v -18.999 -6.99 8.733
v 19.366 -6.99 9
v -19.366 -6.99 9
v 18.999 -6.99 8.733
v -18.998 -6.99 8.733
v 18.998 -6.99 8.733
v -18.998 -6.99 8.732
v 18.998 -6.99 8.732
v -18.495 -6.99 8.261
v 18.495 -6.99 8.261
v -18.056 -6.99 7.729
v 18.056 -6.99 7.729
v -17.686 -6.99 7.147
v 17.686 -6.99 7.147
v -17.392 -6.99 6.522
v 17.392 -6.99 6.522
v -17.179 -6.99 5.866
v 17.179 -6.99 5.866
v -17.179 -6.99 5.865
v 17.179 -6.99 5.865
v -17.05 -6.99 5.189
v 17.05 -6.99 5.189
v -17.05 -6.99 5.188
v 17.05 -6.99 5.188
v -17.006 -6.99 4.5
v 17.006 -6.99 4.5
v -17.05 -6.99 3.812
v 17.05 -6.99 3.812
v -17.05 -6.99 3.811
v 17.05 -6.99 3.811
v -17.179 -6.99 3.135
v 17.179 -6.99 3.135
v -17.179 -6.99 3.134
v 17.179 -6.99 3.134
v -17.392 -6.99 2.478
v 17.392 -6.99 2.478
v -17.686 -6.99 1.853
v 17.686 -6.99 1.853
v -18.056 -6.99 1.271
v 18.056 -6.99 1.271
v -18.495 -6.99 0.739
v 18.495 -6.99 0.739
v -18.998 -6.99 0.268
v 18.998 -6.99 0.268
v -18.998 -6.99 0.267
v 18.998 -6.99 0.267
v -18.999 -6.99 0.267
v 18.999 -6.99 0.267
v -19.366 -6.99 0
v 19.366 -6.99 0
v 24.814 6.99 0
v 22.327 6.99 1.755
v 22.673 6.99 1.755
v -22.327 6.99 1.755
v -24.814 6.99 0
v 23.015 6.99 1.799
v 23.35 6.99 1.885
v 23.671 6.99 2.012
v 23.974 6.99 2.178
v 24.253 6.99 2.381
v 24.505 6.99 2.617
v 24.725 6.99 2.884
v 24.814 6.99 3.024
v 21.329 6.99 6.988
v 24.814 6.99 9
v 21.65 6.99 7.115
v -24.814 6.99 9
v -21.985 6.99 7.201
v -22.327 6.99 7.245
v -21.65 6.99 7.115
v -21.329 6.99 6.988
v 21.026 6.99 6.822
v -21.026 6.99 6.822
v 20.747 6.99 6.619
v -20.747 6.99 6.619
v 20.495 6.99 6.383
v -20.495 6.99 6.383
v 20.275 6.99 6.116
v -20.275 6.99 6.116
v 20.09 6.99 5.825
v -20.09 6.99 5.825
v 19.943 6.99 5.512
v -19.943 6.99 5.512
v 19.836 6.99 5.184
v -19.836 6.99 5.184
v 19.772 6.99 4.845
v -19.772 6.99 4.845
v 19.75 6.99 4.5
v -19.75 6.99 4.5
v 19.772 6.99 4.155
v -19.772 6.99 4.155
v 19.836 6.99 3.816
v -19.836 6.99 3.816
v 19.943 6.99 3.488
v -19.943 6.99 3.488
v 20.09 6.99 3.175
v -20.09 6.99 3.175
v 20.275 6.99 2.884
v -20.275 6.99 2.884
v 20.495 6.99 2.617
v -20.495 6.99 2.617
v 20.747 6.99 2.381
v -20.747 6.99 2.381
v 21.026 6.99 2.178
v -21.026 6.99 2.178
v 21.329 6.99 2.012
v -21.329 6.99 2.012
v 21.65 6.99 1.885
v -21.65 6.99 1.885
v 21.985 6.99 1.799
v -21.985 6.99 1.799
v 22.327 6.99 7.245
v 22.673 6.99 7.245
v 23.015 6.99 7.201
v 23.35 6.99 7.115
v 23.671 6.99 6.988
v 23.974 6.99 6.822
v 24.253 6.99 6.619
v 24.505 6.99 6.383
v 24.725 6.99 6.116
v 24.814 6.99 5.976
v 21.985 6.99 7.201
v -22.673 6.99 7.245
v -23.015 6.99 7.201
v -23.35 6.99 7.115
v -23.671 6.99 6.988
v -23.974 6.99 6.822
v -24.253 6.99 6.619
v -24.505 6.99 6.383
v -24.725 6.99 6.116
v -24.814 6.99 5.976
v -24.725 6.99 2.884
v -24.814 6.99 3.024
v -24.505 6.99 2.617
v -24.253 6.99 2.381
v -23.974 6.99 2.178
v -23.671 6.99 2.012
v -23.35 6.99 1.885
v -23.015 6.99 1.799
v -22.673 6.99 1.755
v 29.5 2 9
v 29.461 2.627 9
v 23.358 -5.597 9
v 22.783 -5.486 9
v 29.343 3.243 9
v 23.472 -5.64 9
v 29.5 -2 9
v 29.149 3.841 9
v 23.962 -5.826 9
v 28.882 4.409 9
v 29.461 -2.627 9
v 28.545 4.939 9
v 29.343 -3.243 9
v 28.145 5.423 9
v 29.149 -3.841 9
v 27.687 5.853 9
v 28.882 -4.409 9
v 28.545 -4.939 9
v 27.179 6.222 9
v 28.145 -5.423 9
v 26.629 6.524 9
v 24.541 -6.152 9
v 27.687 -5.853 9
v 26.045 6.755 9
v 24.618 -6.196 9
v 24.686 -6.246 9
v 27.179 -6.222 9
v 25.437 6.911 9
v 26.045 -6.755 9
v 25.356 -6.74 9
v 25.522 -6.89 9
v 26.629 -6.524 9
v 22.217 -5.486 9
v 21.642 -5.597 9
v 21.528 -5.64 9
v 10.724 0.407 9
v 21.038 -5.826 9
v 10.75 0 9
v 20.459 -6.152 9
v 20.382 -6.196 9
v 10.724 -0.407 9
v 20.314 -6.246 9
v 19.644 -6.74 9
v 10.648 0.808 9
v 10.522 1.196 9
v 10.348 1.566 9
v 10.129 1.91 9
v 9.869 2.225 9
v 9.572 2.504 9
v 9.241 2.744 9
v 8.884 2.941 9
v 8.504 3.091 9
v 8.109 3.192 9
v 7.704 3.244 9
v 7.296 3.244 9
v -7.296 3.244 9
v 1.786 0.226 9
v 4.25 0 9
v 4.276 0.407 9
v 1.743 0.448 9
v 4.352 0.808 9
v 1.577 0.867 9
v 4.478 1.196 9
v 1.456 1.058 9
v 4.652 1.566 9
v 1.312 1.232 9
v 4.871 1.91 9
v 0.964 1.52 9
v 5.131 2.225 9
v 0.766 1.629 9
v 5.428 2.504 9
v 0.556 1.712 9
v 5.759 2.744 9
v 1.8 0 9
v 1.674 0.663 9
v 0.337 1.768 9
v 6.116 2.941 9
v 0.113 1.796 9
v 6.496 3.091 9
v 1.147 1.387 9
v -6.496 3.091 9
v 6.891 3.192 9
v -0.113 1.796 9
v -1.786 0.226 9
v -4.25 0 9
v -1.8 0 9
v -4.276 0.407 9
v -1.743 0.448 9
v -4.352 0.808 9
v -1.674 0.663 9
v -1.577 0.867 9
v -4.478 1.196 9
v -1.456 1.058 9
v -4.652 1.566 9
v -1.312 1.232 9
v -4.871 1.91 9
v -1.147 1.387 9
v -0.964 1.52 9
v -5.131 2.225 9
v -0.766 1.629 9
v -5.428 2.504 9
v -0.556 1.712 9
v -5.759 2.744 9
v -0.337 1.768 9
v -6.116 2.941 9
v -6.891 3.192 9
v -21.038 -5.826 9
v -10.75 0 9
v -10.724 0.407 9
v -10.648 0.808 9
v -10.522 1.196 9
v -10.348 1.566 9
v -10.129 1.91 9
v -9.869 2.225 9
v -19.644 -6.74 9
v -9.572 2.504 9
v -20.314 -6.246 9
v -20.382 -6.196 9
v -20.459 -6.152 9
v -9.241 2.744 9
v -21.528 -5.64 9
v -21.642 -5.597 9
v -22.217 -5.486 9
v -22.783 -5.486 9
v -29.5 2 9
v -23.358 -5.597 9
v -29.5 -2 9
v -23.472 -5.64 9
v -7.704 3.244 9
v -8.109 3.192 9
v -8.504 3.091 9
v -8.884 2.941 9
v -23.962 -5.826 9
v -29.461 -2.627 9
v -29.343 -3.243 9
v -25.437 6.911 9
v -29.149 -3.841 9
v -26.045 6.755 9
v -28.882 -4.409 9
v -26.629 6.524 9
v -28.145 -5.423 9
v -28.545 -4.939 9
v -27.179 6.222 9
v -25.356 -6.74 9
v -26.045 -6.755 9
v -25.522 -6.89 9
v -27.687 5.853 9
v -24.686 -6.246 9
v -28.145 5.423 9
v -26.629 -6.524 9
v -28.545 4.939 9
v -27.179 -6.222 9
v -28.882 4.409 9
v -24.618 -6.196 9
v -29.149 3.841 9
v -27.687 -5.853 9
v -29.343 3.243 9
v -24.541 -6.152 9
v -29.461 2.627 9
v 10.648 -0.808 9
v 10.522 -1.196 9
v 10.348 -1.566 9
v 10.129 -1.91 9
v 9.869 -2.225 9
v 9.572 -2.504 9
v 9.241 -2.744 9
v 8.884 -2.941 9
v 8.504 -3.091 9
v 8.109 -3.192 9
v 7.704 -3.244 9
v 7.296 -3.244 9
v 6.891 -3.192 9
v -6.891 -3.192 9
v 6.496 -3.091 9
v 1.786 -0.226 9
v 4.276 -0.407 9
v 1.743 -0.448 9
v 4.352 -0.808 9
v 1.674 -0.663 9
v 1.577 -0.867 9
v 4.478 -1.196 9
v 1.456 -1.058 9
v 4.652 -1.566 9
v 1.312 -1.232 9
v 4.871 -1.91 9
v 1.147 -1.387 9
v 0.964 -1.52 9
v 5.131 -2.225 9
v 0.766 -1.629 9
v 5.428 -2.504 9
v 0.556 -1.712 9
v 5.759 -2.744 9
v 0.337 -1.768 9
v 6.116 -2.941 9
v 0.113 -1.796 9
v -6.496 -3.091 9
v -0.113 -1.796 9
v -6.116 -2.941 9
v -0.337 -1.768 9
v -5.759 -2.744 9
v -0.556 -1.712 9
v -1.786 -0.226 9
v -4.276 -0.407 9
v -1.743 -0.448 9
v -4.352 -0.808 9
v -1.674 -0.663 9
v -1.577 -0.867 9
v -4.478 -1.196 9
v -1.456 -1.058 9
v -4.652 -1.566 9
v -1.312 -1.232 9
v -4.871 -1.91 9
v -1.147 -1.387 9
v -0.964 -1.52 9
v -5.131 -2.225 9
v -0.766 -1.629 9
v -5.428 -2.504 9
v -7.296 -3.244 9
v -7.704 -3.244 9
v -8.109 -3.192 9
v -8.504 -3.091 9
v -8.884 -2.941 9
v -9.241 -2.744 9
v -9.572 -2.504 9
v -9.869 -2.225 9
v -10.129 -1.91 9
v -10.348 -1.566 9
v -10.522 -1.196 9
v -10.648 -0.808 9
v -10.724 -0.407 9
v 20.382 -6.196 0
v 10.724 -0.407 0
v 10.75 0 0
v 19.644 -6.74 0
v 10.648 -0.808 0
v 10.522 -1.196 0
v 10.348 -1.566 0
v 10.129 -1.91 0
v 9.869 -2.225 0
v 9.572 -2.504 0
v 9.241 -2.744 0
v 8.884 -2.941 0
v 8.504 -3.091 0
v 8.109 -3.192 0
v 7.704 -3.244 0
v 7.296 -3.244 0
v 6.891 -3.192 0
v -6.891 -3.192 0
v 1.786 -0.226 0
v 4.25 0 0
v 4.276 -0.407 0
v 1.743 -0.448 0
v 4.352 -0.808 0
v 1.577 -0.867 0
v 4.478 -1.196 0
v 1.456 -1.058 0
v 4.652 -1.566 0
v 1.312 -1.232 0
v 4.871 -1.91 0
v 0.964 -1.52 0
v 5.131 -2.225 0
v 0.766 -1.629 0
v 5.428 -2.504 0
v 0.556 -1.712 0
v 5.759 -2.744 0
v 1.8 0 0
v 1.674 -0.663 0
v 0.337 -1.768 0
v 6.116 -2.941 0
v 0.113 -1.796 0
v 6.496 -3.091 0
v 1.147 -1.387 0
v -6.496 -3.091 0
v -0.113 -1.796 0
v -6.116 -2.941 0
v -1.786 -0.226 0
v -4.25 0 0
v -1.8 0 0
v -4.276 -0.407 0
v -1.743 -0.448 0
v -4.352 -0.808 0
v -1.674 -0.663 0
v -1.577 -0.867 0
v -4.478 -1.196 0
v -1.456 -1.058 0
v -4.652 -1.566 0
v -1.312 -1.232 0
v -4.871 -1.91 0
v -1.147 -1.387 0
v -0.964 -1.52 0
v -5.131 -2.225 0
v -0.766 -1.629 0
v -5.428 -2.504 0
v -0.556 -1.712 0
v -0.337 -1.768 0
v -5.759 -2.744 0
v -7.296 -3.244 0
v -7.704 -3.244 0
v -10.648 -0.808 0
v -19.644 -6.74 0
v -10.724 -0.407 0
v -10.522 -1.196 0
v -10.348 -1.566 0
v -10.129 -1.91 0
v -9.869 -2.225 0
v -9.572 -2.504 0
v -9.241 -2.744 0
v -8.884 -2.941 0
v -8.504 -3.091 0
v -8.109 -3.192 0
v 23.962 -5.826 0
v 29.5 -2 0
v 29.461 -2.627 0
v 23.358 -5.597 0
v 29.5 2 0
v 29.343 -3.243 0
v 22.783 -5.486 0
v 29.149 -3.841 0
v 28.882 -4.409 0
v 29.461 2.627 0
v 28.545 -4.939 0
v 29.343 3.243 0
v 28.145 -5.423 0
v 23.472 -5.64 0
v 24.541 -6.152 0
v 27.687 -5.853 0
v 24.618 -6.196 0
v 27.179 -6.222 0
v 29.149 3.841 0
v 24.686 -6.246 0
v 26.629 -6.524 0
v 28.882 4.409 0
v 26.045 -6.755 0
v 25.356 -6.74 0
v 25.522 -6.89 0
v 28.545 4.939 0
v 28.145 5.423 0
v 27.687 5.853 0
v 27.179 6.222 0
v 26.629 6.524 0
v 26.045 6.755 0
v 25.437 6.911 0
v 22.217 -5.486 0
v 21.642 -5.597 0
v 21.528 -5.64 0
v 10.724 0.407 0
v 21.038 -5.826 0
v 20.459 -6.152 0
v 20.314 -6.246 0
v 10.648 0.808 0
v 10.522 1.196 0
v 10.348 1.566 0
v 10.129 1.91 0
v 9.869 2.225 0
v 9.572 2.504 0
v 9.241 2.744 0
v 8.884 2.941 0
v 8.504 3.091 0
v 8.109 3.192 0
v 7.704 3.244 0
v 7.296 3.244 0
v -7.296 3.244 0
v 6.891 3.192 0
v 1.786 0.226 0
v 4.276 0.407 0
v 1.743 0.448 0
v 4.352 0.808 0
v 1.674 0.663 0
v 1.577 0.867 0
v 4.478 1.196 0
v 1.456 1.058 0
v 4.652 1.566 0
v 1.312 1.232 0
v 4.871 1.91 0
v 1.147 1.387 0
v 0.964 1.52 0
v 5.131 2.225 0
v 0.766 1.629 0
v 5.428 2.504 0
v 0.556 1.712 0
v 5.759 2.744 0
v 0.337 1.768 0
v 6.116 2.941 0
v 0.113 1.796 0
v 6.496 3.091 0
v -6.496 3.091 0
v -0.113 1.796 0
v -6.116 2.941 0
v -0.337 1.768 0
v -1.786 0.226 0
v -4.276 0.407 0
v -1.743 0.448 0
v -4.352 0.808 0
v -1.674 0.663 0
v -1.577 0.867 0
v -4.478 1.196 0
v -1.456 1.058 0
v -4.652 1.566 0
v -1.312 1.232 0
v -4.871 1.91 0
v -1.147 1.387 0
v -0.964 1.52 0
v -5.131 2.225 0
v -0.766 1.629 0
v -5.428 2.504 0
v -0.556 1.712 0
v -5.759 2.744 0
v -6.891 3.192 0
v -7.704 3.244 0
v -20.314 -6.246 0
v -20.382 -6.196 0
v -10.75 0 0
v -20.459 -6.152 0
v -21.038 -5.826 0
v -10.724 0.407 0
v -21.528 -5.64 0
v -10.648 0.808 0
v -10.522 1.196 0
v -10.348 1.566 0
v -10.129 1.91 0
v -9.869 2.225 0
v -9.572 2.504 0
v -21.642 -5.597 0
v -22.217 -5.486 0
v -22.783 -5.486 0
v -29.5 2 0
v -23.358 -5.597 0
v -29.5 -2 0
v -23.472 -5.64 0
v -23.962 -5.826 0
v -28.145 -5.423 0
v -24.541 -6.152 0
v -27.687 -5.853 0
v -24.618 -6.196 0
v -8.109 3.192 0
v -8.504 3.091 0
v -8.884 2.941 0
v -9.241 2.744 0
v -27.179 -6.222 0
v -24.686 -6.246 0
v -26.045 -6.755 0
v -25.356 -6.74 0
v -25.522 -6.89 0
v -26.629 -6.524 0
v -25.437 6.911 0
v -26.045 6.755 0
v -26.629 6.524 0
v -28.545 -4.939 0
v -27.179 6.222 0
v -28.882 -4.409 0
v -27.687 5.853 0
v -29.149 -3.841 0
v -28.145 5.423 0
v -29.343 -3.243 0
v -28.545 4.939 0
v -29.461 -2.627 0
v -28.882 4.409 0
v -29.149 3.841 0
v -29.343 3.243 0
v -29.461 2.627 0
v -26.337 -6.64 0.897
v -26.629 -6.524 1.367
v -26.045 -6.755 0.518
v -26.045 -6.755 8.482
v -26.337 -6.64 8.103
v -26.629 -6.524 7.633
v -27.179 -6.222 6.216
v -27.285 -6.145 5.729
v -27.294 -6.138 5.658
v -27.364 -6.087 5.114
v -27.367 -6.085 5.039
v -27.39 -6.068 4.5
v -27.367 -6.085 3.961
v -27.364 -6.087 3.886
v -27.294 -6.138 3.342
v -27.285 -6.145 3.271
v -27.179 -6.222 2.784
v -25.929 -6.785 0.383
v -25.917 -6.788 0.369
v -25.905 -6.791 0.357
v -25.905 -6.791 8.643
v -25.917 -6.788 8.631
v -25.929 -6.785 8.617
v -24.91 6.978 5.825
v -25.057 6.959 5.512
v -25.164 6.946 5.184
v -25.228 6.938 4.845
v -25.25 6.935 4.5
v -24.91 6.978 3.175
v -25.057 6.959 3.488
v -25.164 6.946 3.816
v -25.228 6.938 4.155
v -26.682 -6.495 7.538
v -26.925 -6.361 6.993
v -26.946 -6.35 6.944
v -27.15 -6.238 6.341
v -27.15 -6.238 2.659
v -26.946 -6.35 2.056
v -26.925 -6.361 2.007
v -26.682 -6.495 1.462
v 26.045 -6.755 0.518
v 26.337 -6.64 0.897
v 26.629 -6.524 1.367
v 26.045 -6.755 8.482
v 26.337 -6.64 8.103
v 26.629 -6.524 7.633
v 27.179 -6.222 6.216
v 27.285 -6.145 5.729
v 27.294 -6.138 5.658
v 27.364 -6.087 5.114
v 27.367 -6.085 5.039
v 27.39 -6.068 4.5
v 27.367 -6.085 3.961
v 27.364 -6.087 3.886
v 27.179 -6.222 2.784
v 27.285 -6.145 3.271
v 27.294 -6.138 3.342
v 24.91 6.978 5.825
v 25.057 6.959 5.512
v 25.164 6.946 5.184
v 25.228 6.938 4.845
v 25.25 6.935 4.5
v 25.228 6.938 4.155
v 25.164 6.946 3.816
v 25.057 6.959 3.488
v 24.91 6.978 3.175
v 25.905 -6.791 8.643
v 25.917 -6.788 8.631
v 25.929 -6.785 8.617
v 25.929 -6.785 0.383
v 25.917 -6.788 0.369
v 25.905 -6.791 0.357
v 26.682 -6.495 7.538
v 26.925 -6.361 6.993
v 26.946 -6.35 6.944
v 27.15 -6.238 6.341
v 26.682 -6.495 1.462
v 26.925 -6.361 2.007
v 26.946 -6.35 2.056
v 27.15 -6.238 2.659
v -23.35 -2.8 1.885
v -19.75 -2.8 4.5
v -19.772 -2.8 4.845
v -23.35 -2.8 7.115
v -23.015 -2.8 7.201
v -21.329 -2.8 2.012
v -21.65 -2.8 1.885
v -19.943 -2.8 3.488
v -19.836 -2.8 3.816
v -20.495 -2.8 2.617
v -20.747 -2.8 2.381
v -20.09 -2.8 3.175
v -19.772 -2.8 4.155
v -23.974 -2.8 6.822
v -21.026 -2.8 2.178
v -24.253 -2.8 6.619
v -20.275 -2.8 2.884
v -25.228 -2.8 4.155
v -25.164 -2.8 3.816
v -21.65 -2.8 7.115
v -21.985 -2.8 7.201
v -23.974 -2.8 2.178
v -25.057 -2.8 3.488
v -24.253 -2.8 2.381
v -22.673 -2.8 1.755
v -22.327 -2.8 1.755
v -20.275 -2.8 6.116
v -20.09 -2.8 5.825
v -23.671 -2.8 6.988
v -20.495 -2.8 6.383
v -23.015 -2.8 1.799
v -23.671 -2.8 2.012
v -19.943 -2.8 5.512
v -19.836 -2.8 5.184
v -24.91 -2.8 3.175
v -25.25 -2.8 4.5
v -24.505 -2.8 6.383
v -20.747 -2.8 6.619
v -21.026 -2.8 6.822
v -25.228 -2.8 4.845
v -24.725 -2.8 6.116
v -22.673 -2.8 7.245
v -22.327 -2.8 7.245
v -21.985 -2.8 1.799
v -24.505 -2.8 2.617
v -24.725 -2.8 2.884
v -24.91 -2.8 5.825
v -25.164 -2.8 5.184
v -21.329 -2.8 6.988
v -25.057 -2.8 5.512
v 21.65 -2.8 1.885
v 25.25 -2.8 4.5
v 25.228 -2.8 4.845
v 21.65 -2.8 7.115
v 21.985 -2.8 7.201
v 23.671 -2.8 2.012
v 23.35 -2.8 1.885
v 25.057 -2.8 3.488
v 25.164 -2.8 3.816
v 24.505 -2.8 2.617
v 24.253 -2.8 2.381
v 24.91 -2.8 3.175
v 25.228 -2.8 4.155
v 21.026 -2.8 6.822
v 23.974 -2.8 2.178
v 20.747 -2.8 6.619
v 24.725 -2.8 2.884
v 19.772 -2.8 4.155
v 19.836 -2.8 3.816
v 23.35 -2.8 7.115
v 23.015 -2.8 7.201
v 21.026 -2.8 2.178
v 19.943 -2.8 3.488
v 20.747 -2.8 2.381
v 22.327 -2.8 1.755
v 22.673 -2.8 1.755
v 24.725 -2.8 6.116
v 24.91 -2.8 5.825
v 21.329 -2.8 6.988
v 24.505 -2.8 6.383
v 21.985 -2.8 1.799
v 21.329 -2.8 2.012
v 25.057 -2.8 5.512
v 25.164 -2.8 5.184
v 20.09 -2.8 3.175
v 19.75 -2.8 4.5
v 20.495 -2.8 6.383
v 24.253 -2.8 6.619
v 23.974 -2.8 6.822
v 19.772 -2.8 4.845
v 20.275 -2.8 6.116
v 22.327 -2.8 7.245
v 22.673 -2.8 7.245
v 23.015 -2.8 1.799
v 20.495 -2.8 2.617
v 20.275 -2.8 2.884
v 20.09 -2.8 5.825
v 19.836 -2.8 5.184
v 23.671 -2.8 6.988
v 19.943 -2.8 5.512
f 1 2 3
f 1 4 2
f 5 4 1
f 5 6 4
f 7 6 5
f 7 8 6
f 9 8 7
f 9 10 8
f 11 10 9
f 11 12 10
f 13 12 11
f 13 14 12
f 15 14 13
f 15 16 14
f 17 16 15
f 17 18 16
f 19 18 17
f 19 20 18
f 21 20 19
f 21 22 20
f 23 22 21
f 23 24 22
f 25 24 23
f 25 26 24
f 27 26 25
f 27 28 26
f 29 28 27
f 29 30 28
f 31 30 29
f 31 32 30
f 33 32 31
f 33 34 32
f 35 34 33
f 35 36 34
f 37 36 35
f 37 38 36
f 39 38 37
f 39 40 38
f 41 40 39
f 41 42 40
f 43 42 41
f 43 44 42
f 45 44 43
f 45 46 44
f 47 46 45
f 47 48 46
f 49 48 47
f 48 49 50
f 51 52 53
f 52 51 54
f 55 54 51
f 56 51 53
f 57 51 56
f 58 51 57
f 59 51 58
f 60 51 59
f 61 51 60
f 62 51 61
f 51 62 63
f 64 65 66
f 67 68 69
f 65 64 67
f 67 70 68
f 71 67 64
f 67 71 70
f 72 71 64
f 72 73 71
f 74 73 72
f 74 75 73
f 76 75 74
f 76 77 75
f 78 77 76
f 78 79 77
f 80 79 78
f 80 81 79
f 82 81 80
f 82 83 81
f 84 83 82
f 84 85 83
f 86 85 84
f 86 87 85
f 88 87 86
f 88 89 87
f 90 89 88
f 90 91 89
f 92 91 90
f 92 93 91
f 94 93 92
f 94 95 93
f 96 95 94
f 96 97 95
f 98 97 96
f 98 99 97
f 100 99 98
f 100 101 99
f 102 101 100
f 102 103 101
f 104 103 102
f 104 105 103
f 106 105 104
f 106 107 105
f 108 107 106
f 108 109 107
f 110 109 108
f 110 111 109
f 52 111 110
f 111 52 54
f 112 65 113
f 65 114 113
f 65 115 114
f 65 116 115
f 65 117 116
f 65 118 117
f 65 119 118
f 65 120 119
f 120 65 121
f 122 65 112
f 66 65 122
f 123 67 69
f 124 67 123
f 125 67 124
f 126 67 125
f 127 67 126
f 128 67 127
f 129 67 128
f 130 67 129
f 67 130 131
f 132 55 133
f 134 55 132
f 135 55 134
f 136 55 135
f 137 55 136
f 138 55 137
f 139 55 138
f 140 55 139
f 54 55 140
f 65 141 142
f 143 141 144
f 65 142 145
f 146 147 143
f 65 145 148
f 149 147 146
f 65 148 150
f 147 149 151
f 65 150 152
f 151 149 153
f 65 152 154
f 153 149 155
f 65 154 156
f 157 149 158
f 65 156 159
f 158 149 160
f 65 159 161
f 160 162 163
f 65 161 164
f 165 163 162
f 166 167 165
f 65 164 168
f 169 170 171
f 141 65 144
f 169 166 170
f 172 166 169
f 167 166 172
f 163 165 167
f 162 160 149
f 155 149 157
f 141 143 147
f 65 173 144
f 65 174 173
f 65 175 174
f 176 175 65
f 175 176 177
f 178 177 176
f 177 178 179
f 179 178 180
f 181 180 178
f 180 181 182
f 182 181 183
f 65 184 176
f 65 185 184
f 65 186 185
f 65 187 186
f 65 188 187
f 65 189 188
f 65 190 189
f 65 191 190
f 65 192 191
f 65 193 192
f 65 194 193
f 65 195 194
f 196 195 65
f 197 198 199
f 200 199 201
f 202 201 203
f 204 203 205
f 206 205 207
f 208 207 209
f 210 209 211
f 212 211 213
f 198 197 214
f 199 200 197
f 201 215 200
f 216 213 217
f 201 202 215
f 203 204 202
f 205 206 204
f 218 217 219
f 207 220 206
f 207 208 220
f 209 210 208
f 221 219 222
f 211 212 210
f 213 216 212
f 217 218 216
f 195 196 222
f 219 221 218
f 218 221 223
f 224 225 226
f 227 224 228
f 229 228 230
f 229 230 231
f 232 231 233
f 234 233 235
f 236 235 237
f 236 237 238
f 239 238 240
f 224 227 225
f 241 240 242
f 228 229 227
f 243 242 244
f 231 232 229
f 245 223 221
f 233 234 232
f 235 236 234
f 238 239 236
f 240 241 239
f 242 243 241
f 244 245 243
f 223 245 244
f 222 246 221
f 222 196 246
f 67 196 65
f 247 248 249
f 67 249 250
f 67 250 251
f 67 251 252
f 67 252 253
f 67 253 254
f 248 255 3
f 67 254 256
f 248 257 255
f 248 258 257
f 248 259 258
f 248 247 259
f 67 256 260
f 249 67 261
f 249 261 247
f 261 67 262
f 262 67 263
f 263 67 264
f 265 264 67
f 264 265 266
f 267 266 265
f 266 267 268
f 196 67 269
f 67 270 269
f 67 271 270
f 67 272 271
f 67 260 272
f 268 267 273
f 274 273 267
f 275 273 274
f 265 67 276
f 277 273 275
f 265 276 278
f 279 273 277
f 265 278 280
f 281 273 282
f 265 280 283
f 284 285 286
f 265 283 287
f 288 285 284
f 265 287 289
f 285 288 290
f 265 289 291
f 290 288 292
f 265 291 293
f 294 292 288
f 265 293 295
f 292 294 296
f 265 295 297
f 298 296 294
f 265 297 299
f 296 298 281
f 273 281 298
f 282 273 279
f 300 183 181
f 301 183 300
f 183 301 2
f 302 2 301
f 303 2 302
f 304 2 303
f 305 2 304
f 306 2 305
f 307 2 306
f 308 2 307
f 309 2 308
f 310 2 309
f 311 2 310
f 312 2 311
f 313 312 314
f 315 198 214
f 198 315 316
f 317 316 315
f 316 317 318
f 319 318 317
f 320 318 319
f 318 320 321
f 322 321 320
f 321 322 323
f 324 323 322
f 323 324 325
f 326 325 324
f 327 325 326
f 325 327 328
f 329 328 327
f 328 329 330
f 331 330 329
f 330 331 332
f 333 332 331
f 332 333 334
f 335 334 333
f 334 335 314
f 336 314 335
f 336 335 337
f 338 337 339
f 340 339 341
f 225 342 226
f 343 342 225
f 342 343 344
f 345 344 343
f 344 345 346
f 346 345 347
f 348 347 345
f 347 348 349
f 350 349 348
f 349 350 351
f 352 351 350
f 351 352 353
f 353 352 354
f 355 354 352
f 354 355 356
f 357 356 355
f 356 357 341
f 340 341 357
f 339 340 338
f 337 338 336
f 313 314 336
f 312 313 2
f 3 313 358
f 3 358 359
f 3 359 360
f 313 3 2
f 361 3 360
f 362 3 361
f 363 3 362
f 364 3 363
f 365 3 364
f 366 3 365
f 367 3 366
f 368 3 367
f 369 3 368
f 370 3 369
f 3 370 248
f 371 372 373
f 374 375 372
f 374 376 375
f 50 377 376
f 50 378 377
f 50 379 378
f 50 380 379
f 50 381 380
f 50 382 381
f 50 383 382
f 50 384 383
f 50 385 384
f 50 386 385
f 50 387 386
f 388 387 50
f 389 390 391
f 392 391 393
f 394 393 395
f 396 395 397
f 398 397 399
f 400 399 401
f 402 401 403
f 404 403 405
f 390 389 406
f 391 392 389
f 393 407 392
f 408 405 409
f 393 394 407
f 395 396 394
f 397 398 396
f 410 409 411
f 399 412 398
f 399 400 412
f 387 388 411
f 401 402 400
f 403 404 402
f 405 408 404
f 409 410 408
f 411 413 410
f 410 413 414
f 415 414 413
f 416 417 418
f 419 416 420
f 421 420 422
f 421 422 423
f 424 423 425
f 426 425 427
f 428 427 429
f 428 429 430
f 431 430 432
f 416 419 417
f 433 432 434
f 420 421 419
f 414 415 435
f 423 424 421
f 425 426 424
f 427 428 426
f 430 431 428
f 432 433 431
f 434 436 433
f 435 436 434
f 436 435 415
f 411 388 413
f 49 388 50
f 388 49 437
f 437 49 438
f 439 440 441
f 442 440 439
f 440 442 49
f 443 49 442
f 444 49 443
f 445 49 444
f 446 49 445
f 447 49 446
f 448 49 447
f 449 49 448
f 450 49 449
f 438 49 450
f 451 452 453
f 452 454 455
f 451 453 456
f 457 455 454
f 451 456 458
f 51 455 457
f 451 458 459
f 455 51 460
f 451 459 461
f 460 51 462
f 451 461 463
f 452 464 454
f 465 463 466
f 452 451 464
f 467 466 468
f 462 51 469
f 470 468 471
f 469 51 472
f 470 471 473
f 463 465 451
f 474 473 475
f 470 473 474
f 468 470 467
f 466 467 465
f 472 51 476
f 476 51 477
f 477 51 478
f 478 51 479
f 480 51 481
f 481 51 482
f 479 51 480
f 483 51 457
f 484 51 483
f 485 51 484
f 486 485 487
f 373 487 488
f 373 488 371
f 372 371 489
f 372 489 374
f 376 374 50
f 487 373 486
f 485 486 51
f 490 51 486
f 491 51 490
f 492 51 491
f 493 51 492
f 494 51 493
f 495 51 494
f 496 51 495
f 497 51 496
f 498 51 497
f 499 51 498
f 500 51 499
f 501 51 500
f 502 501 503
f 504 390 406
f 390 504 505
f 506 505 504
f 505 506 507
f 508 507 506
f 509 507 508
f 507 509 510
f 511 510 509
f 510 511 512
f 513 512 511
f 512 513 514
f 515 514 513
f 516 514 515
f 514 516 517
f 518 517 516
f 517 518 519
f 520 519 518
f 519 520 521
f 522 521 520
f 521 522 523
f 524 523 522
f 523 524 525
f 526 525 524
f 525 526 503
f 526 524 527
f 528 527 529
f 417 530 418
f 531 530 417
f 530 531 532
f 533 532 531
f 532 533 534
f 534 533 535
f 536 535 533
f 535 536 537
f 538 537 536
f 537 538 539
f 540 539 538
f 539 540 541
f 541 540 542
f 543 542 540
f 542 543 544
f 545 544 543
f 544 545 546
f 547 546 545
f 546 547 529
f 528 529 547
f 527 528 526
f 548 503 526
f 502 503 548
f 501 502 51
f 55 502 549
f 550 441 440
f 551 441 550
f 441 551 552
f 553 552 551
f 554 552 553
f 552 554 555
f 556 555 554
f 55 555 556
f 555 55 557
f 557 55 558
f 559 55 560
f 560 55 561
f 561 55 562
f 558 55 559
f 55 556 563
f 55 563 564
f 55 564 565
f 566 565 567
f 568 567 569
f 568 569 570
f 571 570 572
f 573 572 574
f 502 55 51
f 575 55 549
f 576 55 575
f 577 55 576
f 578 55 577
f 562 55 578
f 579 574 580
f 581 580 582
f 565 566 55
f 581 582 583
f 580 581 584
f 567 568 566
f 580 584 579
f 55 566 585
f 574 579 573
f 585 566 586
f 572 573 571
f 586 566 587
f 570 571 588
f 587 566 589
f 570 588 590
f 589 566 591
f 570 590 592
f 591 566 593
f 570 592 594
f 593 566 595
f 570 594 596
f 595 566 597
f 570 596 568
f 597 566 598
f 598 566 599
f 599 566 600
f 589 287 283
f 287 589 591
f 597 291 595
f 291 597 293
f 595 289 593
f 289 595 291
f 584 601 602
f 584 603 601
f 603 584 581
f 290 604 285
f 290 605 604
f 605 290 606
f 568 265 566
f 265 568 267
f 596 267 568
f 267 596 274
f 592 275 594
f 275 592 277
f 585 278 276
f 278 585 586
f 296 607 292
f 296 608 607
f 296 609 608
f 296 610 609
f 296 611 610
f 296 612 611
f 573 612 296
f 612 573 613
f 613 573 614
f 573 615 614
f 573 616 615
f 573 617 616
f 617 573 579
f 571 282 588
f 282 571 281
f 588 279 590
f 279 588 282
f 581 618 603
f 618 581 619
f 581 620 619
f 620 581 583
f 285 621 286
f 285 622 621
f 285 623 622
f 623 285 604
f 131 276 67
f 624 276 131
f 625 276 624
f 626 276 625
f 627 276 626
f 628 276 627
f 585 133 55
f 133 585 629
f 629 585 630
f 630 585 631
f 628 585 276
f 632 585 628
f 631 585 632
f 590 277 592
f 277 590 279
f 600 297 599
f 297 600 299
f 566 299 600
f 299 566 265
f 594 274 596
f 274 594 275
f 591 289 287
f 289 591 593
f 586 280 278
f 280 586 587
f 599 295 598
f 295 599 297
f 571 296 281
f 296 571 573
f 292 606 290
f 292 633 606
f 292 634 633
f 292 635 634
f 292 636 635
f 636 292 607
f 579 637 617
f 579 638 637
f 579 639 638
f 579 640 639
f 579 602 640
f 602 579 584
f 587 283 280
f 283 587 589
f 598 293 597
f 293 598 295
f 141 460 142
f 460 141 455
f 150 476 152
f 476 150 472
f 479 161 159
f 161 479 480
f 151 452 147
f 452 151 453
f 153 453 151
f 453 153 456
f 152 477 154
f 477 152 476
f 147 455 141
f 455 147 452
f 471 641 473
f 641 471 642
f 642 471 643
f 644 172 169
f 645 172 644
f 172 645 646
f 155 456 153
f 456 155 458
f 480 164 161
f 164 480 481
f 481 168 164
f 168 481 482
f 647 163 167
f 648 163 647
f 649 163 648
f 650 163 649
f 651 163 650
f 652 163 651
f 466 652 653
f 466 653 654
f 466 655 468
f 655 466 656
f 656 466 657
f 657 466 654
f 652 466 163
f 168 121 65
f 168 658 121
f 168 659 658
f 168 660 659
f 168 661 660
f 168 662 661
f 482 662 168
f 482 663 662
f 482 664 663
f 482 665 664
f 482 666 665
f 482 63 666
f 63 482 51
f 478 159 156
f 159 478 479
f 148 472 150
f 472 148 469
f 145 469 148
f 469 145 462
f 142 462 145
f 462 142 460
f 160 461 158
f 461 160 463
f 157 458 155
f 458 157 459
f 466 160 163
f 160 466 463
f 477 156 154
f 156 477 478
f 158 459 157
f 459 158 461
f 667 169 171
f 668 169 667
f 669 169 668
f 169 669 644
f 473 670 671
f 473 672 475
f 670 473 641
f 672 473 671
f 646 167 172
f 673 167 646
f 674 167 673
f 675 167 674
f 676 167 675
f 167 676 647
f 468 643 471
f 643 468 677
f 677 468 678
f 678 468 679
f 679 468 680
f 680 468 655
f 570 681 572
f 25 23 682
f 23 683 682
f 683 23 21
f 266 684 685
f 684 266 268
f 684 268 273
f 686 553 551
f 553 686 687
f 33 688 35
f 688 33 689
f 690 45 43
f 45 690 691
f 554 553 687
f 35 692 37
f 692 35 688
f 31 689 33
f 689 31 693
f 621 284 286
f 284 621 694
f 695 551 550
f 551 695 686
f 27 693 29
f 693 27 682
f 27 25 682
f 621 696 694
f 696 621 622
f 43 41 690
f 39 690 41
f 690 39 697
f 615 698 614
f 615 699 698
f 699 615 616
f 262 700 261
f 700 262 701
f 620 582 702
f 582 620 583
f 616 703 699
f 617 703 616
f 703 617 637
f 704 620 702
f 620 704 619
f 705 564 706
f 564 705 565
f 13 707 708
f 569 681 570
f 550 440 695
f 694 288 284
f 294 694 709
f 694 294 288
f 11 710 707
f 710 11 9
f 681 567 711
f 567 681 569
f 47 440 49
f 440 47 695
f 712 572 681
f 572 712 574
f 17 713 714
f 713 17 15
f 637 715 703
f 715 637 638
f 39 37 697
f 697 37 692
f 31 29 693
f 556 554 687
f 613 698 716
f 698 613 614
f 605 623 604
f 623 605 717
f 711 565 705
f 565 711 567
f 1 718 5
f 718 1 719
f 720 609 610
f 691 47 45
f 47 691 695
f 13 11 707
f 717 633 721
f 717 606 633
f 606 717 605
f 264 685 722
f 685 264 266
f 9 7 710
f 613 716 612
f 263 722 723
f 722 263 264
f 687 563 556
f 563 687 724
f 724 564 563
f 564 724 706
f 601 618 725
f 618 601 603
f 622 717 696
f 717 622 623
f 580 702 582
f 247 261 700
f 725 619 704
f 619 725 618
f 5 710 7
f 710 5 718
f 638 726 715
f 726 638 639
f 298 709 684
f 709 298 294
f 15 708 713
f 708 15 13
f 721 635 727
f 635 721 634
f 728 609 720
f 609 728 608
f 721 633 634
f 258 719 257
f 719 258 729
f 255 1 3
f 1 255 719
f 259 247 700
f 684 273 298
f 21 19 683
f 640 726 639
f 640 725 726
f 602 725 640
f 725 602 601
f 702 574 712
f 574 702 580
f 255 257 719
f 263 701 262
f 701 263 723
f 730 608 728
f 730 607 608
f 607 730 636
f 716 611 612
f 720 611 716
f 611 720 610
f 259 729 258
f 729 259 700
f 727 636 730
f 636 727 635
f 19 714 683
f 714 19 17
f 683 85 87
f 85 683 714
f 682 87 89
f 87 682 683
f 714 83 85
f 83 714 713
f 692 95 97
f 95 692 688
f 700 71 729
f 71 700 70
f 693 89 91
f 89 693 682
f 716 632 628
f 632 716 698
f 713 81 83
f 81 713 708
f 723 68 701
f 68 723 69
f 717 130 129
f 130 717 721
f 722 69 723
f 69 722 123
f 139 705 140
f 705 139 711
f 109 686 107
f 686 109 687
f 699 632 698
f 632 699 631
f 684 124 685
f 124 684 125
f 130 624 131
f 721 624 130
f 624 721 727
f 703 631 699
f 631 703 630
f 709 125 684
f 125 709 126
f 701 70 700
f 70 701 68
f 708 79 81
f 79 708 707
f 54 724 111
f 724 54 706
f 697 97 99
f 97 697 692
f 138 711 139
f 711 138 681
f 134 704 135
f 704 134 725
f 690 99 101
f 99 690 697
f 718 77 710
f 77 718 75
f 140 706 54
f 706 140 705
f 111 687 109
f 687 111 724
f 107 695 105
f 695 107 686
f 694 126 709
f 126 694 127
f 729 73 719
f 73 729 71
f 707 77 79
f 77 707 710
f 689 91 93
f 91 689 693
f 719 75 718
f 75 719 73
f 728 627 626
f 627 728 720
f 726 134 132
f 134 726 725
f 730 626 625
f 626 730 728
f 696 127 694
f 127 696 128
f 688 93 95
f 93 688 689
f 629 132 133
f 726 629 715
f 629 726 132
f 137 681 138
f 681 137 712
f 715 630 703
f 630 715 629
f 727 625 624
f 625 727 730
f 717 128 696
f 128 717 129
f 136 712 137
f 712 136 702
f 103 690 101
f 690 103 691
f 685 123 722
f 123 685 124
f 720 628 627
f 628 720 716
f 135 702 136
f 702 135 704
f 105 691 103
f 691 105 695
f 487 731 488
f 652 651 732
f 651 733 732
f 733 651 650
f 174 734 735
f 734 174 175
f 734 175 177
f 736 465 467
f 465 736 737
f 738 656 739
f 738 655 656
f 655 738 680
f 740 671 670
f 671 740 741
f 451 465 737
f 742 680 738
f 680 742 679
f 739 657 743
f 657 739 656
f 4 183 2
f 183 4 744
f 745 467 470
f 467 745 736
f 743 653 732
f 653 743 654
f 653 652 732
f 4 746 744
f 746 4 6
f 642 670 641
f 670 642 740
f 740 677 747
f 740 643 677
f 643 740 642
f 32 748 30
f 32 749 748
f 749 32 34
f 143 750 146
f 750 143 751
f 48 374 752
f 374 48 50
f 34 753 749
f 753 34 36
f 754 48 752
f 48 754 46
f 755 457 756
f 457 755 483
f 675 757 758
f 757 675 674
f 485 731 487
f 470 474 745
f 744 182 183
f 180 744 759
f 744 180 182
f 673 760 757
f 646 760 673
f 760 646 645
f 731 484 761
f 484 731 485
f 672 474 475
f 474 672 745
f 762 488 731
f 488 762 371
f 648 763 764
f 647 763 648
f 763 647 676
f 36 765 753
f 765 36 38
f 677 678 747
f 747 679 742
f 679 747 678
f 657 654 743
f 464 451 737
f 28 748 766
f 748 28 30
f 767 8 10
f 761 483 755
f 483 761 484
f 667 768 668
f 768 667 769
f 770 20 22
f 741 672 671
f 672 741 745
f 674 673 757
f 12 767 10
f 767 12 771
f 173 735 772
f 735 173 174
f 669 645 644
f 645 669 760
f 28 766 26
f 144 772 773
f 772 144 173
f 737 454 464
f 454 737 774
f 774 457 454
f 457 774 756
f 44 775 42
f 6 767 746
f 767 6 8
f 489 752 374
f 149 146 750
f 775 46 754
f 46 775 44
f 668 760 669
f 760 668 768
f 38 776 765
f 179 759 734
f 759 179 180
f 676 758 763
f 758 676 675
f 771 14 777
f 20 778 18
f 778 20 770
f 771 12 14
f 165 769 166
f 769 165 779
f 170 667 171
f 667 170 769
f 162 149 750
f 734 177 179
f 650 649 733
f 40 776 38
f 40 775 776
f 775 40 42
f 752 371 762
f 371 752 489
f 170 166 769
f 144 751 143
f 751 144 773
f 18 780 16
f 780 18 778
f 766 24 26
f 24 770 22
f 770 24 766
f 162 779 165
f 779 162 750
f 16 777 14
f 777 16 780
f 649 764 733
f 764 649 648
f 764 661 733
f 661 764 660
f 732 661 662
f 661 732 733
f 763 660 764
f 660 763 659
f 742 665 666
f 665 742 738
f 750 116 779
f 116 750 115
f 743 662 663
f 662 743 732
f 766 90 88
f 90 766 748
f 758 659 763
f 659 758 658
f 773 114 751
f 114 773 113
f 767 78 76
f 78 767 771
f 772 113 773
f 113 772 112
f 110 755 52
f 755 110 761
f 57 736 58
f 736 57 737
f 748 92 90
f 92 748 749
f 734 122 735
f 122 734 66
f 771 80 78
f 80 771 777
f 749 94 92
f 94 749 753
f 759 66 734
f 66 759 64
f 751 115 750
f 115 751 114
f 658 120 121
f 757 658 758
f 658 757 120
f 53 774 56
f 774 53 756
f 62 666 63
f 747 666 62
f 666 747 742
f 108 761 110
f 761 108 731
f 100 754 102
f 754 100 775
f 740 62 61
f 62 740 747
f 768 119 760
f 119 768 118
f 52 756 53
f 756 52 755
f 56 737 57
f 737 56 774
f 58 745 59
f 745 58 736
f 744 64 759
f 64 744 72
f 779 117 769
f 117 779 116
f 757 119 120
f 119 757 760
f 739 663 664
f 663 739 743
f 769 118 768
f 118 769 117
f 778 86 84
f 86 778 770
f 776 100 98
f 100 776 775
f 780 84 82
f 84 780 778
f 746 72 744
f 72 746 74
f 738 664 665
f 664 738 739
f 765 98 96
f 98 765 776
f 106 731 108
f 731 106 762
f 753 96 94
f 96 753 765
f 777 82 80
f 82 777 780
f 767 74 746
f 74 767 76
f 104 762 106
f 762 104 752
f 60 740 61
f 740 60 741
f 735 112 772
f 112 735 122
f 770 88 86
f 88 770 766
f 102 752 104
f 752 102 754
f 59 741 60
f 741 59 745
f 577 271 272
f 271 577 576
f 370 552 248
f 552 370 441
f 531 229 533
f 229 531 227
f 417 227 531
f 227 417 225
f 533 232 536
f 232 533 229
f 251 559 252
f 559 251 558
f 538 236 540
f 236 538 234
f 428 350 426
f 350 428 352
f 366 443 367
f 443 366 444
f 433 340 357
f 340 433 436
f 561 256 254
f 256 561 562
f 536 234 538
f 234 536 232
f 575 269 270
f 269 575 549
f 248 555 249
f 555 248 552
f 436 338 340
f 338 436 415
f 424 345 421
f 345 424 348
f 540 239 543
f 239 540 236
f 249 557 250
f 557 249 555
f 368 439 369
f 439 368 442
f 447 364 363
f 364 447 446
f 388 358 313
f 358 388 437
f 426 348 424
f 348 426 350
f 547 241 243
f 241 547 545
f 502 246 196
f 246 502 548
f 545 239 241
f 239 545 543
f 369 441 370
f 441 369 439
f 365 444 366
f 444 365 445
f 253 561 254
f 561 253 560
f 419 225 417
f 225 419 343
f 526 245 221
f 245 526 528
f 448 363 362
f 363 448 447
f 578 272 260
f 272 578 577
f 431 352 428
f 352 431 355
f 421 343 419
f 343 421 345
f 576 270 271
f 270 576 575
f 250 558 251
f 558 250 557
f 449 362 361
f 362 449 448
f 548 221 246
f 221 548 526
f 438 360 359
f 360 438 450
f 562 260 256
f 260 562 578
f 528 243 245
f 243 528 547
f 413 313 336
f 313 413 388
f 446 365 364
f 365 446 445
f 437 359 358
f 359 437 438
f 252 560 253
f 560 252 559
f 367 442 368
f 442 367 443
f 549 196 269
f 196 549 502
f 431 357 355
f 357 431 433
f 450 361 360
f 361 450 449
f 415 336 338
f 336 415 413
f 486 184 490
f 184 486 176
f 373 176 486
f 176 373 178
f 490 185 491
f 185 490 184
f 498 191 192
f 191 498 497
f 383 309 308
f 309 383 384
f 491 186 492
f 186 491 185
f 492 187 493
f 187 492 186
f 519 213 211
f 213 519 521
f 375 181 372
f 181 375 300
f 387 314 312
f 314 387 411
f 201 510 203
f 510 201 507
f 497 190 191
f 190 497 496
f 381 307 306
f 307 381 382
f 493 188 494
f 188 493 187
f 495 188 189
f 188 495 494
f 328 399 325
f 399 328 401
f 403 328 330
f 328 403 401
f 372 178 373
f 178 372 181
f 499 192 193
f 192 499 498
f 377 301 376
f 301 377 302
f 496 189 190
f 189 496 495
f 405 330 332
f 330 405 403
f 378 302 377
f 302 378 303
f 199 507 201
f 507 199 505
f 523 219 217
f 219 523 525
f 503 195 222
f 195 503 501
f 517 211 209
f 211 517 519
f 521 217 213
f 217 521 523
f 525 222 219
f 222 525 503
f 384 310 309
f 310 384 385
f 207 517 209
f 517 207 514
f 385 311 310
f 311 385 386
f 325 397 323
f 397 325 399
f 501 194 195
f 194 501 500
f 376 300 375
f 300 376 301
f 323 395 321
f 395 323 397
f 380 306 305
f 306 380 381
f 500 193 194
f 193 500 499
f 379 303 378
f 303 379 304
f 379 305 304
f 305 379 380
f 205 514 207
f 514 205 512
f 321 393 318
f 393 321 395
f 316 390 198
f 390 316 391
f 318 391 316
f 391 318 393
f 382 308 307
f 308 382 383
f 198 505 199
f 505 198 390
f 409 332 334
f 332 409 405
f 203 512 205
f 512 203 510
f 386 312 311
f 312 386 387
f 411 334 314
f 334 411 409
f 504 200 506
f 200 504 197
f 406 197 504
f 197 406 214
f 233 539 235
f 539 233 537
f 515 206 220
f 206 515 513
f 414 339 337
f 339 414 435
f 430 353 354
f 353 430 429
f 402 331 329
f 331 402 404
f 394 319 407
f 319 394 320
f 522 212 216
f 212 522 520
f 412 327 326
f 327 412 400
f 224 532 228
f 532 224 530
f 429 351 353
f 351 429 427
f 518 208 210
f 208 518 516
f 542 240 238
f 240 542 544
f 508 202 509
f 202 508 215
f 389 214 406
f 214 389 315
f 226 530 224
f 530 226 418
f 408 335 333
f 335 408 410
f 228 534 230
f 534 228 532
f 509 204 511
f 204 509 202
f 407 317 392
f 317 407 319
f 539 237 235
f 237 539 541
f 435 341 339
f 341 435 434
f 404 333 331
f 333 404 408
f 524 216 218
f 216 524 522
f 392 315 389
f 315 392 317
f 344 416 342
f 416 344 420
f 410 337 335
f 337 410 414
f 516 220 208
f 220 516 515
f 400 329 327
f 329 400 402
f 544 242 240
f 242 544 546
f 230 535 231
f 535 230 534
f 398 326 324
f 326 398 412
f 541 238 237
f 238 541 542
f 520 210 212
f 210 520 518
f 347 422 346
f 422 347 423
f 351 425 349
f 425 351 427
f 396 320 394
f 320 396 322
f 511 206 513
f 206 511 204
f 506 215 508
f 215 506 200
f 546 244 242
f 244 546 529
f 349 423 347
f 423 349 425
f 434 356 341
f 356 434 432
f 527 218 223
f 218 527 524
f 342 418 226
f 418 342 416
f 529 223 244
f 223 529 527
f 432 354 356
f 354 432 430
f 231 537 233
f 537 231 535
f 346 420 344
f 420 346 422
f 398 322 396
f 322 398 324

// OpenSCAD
$fn = 50;


difference() {
	union() {
		hull() {
			translate(v = [-9.5000000000, 2.0000000000, 0]) {
				cylinder(h = 9, r = 5);
			}
			translate(v = [9.5000000000, 2.0000000000, 0]) {
				cylinder(h = 9, r = 5);
			}
			translate(v = [-9.5000000000, -2.0000000000, 0]) {
				cylinder(h = 9, r = 5);
			}
			translate(v = [9.5000000000, -2.0000000000, 0]) {
				cylinder(h = 9, r = 5);
			}
		}
		translate(v = [-15.0000000000, 0.0000000000, 0]) {
			hull() {
				translate(v = [-9.5000000000, 2.0000000000, 0]) {
					cylinder(h = 9, r = 5);
				}
				translate(v = [9.5000000000, 2.0000000000, 0]) {
					cylinder(h = 9, r = 5);
				}
				translate(v = [-9.5000000000, -2.0000000000, 0]) {
					cylinder(h = 9, r = 5);
				}
				translate(v = [9.5000000000, -2.0000000000, 0]) {
					cylinder(h = 9, r = 5);
				}
			}
		}
		translate(v = [-15.0000000000, 0.0000000000, 0]) {
			hull() {
				translate(v = [-9.5000000000, 2.0000000000, 0]) {
					cylinder(h = 9, r = 5);
				}
				translate(v = [9.5000000000, 2.0000000000, 0]) {
					cylinder(h = 9, r = 5);
				}
				translate(v = [-9.5000000000, -2.0000000000, 0]) {
					cylinder(h = 9, r = 5);
				}
				translate(v = [9.5000000000, -2.0000000000, 0]) {
					cylinder(h = 9, r = 5);
				}
			}
		}
		translate(v = [15.0000000000, 0.0000000000, 0]) {
			hull() {
				translate(v = [-9.5000000000, 2.0000000000, 0]) {
					cylinder(h = 9, r = 5);
				}
				translate(v = [9.5000000000, 2.0000000000, 0]) {
					cylinder(h = 9, r = 5);
				}
				translate(v = [-9.5000000000, -2.0000000000, 0]) {
					cylinder(h = 9, r = 5);
				}
				translate(v = [9.5000000000, -2.0000000000, 0]) {
					cylinder(h = 9, r = 5);
				}
			}
		}
		translate(v = [15.0000000000, 0.0000000000, 0]) {
			hull() {
				translate(v = [-9.5000000000, 2.0000000000, 0]) {
					cylinder(h = 9, r = 5);
				}
				translate(v = [9.5000000000, 2.0000000000, 0]) {
					cylinder(h = 9, r = 5);
				}
				translate(v = [-9.5000000000, -2.0000000000, 0]) {
					cylinder(h = 9, r = 5);
				}
				translate(v = [9.5000000000, -2.0000000000, 0]) {
					cylinder(h = 9, r = 5);
				}
			}
		}
	}
	union() {
		translate(v = [-22.5000000000, -7.0000000000, 4.5000000000]) {
			rotate(a = [90, 0, 0]) {
				difference() {
					union() {
						#translate(v = [0, 0, -14.0000000000]) {
							cylinder(h = 14, r = 2.2500000000);
						}
						#translate(v = [0, 0, -4.2000000000]) {
							cylinder(h = 4.2000000000, r1 = 2.7500000000, r2 = 5.5000000000);
						}
						#translate(v = [0, 0, -14.0000000000]) {
							cylinder(h = 14, r = 2.7500000000);
						}
						#translate(v = [0, 0, -14.0000000000]) {
							cylinder(h = 14, r = 2.2500000000);
						}
					}
					union();
				}
			}
		}
		translate(v = [22.5000000000, -7.0000000000, 4.5000000000]) {
			rotate(a = [90, 0, 0]) {
				difference() {
					union() {
						#translate(v = [0, 0, -14.0000000000]) {
							cylinder(h = 14, r = 2.2500000000);
						}
						#translate(v = [0, 0, -4.2000000000]) {
							cylinder(h = 4.2000000000, r1 = 2.7500000000, r2 = 5.5000000000);
						}
						#translate(v = [0, 0, -14.0000000000]) {
							cylinder(h = 14, r = 2.7500000000);
						}
						#translate(v = [0, 0, -14.0000000000]) {
							cylinder(h = 14, r = 2.2500000000);
						}
					}
					union();
				}
			}
		}
		translate(v = [-7.5000000000, 0.0000000000, 0]) {
			translate(v = [0, 0, -100]) {
				cylinder(h = 200, r = 3.2500000000);
			}
		}
		translate(v = [7.5000000000, 0.0000000000, 0]) {
			translate(v = [0, 0, -100]) {
				cylinder(h = 200, r = 3.2500000000);
			}
		}
		translate(v = [-7.5000000000, 0.0000000000, 0]) {
			translate(v = [0, 0, -100]) {
				cylinder(h = 200, r = 1.8000000000);
			}
		}
		translate(v = [0, 0, -100]) {
			cylinder(h = 200, r = 1.8000000000);
		}
		translate(v = [7.5000000000, 0.0000000000, 0]) {
			translate(v = [0, 0, -100]) {
				cylinder(h = 200, r = 1.8000000000);
			}
		}
	}
}
